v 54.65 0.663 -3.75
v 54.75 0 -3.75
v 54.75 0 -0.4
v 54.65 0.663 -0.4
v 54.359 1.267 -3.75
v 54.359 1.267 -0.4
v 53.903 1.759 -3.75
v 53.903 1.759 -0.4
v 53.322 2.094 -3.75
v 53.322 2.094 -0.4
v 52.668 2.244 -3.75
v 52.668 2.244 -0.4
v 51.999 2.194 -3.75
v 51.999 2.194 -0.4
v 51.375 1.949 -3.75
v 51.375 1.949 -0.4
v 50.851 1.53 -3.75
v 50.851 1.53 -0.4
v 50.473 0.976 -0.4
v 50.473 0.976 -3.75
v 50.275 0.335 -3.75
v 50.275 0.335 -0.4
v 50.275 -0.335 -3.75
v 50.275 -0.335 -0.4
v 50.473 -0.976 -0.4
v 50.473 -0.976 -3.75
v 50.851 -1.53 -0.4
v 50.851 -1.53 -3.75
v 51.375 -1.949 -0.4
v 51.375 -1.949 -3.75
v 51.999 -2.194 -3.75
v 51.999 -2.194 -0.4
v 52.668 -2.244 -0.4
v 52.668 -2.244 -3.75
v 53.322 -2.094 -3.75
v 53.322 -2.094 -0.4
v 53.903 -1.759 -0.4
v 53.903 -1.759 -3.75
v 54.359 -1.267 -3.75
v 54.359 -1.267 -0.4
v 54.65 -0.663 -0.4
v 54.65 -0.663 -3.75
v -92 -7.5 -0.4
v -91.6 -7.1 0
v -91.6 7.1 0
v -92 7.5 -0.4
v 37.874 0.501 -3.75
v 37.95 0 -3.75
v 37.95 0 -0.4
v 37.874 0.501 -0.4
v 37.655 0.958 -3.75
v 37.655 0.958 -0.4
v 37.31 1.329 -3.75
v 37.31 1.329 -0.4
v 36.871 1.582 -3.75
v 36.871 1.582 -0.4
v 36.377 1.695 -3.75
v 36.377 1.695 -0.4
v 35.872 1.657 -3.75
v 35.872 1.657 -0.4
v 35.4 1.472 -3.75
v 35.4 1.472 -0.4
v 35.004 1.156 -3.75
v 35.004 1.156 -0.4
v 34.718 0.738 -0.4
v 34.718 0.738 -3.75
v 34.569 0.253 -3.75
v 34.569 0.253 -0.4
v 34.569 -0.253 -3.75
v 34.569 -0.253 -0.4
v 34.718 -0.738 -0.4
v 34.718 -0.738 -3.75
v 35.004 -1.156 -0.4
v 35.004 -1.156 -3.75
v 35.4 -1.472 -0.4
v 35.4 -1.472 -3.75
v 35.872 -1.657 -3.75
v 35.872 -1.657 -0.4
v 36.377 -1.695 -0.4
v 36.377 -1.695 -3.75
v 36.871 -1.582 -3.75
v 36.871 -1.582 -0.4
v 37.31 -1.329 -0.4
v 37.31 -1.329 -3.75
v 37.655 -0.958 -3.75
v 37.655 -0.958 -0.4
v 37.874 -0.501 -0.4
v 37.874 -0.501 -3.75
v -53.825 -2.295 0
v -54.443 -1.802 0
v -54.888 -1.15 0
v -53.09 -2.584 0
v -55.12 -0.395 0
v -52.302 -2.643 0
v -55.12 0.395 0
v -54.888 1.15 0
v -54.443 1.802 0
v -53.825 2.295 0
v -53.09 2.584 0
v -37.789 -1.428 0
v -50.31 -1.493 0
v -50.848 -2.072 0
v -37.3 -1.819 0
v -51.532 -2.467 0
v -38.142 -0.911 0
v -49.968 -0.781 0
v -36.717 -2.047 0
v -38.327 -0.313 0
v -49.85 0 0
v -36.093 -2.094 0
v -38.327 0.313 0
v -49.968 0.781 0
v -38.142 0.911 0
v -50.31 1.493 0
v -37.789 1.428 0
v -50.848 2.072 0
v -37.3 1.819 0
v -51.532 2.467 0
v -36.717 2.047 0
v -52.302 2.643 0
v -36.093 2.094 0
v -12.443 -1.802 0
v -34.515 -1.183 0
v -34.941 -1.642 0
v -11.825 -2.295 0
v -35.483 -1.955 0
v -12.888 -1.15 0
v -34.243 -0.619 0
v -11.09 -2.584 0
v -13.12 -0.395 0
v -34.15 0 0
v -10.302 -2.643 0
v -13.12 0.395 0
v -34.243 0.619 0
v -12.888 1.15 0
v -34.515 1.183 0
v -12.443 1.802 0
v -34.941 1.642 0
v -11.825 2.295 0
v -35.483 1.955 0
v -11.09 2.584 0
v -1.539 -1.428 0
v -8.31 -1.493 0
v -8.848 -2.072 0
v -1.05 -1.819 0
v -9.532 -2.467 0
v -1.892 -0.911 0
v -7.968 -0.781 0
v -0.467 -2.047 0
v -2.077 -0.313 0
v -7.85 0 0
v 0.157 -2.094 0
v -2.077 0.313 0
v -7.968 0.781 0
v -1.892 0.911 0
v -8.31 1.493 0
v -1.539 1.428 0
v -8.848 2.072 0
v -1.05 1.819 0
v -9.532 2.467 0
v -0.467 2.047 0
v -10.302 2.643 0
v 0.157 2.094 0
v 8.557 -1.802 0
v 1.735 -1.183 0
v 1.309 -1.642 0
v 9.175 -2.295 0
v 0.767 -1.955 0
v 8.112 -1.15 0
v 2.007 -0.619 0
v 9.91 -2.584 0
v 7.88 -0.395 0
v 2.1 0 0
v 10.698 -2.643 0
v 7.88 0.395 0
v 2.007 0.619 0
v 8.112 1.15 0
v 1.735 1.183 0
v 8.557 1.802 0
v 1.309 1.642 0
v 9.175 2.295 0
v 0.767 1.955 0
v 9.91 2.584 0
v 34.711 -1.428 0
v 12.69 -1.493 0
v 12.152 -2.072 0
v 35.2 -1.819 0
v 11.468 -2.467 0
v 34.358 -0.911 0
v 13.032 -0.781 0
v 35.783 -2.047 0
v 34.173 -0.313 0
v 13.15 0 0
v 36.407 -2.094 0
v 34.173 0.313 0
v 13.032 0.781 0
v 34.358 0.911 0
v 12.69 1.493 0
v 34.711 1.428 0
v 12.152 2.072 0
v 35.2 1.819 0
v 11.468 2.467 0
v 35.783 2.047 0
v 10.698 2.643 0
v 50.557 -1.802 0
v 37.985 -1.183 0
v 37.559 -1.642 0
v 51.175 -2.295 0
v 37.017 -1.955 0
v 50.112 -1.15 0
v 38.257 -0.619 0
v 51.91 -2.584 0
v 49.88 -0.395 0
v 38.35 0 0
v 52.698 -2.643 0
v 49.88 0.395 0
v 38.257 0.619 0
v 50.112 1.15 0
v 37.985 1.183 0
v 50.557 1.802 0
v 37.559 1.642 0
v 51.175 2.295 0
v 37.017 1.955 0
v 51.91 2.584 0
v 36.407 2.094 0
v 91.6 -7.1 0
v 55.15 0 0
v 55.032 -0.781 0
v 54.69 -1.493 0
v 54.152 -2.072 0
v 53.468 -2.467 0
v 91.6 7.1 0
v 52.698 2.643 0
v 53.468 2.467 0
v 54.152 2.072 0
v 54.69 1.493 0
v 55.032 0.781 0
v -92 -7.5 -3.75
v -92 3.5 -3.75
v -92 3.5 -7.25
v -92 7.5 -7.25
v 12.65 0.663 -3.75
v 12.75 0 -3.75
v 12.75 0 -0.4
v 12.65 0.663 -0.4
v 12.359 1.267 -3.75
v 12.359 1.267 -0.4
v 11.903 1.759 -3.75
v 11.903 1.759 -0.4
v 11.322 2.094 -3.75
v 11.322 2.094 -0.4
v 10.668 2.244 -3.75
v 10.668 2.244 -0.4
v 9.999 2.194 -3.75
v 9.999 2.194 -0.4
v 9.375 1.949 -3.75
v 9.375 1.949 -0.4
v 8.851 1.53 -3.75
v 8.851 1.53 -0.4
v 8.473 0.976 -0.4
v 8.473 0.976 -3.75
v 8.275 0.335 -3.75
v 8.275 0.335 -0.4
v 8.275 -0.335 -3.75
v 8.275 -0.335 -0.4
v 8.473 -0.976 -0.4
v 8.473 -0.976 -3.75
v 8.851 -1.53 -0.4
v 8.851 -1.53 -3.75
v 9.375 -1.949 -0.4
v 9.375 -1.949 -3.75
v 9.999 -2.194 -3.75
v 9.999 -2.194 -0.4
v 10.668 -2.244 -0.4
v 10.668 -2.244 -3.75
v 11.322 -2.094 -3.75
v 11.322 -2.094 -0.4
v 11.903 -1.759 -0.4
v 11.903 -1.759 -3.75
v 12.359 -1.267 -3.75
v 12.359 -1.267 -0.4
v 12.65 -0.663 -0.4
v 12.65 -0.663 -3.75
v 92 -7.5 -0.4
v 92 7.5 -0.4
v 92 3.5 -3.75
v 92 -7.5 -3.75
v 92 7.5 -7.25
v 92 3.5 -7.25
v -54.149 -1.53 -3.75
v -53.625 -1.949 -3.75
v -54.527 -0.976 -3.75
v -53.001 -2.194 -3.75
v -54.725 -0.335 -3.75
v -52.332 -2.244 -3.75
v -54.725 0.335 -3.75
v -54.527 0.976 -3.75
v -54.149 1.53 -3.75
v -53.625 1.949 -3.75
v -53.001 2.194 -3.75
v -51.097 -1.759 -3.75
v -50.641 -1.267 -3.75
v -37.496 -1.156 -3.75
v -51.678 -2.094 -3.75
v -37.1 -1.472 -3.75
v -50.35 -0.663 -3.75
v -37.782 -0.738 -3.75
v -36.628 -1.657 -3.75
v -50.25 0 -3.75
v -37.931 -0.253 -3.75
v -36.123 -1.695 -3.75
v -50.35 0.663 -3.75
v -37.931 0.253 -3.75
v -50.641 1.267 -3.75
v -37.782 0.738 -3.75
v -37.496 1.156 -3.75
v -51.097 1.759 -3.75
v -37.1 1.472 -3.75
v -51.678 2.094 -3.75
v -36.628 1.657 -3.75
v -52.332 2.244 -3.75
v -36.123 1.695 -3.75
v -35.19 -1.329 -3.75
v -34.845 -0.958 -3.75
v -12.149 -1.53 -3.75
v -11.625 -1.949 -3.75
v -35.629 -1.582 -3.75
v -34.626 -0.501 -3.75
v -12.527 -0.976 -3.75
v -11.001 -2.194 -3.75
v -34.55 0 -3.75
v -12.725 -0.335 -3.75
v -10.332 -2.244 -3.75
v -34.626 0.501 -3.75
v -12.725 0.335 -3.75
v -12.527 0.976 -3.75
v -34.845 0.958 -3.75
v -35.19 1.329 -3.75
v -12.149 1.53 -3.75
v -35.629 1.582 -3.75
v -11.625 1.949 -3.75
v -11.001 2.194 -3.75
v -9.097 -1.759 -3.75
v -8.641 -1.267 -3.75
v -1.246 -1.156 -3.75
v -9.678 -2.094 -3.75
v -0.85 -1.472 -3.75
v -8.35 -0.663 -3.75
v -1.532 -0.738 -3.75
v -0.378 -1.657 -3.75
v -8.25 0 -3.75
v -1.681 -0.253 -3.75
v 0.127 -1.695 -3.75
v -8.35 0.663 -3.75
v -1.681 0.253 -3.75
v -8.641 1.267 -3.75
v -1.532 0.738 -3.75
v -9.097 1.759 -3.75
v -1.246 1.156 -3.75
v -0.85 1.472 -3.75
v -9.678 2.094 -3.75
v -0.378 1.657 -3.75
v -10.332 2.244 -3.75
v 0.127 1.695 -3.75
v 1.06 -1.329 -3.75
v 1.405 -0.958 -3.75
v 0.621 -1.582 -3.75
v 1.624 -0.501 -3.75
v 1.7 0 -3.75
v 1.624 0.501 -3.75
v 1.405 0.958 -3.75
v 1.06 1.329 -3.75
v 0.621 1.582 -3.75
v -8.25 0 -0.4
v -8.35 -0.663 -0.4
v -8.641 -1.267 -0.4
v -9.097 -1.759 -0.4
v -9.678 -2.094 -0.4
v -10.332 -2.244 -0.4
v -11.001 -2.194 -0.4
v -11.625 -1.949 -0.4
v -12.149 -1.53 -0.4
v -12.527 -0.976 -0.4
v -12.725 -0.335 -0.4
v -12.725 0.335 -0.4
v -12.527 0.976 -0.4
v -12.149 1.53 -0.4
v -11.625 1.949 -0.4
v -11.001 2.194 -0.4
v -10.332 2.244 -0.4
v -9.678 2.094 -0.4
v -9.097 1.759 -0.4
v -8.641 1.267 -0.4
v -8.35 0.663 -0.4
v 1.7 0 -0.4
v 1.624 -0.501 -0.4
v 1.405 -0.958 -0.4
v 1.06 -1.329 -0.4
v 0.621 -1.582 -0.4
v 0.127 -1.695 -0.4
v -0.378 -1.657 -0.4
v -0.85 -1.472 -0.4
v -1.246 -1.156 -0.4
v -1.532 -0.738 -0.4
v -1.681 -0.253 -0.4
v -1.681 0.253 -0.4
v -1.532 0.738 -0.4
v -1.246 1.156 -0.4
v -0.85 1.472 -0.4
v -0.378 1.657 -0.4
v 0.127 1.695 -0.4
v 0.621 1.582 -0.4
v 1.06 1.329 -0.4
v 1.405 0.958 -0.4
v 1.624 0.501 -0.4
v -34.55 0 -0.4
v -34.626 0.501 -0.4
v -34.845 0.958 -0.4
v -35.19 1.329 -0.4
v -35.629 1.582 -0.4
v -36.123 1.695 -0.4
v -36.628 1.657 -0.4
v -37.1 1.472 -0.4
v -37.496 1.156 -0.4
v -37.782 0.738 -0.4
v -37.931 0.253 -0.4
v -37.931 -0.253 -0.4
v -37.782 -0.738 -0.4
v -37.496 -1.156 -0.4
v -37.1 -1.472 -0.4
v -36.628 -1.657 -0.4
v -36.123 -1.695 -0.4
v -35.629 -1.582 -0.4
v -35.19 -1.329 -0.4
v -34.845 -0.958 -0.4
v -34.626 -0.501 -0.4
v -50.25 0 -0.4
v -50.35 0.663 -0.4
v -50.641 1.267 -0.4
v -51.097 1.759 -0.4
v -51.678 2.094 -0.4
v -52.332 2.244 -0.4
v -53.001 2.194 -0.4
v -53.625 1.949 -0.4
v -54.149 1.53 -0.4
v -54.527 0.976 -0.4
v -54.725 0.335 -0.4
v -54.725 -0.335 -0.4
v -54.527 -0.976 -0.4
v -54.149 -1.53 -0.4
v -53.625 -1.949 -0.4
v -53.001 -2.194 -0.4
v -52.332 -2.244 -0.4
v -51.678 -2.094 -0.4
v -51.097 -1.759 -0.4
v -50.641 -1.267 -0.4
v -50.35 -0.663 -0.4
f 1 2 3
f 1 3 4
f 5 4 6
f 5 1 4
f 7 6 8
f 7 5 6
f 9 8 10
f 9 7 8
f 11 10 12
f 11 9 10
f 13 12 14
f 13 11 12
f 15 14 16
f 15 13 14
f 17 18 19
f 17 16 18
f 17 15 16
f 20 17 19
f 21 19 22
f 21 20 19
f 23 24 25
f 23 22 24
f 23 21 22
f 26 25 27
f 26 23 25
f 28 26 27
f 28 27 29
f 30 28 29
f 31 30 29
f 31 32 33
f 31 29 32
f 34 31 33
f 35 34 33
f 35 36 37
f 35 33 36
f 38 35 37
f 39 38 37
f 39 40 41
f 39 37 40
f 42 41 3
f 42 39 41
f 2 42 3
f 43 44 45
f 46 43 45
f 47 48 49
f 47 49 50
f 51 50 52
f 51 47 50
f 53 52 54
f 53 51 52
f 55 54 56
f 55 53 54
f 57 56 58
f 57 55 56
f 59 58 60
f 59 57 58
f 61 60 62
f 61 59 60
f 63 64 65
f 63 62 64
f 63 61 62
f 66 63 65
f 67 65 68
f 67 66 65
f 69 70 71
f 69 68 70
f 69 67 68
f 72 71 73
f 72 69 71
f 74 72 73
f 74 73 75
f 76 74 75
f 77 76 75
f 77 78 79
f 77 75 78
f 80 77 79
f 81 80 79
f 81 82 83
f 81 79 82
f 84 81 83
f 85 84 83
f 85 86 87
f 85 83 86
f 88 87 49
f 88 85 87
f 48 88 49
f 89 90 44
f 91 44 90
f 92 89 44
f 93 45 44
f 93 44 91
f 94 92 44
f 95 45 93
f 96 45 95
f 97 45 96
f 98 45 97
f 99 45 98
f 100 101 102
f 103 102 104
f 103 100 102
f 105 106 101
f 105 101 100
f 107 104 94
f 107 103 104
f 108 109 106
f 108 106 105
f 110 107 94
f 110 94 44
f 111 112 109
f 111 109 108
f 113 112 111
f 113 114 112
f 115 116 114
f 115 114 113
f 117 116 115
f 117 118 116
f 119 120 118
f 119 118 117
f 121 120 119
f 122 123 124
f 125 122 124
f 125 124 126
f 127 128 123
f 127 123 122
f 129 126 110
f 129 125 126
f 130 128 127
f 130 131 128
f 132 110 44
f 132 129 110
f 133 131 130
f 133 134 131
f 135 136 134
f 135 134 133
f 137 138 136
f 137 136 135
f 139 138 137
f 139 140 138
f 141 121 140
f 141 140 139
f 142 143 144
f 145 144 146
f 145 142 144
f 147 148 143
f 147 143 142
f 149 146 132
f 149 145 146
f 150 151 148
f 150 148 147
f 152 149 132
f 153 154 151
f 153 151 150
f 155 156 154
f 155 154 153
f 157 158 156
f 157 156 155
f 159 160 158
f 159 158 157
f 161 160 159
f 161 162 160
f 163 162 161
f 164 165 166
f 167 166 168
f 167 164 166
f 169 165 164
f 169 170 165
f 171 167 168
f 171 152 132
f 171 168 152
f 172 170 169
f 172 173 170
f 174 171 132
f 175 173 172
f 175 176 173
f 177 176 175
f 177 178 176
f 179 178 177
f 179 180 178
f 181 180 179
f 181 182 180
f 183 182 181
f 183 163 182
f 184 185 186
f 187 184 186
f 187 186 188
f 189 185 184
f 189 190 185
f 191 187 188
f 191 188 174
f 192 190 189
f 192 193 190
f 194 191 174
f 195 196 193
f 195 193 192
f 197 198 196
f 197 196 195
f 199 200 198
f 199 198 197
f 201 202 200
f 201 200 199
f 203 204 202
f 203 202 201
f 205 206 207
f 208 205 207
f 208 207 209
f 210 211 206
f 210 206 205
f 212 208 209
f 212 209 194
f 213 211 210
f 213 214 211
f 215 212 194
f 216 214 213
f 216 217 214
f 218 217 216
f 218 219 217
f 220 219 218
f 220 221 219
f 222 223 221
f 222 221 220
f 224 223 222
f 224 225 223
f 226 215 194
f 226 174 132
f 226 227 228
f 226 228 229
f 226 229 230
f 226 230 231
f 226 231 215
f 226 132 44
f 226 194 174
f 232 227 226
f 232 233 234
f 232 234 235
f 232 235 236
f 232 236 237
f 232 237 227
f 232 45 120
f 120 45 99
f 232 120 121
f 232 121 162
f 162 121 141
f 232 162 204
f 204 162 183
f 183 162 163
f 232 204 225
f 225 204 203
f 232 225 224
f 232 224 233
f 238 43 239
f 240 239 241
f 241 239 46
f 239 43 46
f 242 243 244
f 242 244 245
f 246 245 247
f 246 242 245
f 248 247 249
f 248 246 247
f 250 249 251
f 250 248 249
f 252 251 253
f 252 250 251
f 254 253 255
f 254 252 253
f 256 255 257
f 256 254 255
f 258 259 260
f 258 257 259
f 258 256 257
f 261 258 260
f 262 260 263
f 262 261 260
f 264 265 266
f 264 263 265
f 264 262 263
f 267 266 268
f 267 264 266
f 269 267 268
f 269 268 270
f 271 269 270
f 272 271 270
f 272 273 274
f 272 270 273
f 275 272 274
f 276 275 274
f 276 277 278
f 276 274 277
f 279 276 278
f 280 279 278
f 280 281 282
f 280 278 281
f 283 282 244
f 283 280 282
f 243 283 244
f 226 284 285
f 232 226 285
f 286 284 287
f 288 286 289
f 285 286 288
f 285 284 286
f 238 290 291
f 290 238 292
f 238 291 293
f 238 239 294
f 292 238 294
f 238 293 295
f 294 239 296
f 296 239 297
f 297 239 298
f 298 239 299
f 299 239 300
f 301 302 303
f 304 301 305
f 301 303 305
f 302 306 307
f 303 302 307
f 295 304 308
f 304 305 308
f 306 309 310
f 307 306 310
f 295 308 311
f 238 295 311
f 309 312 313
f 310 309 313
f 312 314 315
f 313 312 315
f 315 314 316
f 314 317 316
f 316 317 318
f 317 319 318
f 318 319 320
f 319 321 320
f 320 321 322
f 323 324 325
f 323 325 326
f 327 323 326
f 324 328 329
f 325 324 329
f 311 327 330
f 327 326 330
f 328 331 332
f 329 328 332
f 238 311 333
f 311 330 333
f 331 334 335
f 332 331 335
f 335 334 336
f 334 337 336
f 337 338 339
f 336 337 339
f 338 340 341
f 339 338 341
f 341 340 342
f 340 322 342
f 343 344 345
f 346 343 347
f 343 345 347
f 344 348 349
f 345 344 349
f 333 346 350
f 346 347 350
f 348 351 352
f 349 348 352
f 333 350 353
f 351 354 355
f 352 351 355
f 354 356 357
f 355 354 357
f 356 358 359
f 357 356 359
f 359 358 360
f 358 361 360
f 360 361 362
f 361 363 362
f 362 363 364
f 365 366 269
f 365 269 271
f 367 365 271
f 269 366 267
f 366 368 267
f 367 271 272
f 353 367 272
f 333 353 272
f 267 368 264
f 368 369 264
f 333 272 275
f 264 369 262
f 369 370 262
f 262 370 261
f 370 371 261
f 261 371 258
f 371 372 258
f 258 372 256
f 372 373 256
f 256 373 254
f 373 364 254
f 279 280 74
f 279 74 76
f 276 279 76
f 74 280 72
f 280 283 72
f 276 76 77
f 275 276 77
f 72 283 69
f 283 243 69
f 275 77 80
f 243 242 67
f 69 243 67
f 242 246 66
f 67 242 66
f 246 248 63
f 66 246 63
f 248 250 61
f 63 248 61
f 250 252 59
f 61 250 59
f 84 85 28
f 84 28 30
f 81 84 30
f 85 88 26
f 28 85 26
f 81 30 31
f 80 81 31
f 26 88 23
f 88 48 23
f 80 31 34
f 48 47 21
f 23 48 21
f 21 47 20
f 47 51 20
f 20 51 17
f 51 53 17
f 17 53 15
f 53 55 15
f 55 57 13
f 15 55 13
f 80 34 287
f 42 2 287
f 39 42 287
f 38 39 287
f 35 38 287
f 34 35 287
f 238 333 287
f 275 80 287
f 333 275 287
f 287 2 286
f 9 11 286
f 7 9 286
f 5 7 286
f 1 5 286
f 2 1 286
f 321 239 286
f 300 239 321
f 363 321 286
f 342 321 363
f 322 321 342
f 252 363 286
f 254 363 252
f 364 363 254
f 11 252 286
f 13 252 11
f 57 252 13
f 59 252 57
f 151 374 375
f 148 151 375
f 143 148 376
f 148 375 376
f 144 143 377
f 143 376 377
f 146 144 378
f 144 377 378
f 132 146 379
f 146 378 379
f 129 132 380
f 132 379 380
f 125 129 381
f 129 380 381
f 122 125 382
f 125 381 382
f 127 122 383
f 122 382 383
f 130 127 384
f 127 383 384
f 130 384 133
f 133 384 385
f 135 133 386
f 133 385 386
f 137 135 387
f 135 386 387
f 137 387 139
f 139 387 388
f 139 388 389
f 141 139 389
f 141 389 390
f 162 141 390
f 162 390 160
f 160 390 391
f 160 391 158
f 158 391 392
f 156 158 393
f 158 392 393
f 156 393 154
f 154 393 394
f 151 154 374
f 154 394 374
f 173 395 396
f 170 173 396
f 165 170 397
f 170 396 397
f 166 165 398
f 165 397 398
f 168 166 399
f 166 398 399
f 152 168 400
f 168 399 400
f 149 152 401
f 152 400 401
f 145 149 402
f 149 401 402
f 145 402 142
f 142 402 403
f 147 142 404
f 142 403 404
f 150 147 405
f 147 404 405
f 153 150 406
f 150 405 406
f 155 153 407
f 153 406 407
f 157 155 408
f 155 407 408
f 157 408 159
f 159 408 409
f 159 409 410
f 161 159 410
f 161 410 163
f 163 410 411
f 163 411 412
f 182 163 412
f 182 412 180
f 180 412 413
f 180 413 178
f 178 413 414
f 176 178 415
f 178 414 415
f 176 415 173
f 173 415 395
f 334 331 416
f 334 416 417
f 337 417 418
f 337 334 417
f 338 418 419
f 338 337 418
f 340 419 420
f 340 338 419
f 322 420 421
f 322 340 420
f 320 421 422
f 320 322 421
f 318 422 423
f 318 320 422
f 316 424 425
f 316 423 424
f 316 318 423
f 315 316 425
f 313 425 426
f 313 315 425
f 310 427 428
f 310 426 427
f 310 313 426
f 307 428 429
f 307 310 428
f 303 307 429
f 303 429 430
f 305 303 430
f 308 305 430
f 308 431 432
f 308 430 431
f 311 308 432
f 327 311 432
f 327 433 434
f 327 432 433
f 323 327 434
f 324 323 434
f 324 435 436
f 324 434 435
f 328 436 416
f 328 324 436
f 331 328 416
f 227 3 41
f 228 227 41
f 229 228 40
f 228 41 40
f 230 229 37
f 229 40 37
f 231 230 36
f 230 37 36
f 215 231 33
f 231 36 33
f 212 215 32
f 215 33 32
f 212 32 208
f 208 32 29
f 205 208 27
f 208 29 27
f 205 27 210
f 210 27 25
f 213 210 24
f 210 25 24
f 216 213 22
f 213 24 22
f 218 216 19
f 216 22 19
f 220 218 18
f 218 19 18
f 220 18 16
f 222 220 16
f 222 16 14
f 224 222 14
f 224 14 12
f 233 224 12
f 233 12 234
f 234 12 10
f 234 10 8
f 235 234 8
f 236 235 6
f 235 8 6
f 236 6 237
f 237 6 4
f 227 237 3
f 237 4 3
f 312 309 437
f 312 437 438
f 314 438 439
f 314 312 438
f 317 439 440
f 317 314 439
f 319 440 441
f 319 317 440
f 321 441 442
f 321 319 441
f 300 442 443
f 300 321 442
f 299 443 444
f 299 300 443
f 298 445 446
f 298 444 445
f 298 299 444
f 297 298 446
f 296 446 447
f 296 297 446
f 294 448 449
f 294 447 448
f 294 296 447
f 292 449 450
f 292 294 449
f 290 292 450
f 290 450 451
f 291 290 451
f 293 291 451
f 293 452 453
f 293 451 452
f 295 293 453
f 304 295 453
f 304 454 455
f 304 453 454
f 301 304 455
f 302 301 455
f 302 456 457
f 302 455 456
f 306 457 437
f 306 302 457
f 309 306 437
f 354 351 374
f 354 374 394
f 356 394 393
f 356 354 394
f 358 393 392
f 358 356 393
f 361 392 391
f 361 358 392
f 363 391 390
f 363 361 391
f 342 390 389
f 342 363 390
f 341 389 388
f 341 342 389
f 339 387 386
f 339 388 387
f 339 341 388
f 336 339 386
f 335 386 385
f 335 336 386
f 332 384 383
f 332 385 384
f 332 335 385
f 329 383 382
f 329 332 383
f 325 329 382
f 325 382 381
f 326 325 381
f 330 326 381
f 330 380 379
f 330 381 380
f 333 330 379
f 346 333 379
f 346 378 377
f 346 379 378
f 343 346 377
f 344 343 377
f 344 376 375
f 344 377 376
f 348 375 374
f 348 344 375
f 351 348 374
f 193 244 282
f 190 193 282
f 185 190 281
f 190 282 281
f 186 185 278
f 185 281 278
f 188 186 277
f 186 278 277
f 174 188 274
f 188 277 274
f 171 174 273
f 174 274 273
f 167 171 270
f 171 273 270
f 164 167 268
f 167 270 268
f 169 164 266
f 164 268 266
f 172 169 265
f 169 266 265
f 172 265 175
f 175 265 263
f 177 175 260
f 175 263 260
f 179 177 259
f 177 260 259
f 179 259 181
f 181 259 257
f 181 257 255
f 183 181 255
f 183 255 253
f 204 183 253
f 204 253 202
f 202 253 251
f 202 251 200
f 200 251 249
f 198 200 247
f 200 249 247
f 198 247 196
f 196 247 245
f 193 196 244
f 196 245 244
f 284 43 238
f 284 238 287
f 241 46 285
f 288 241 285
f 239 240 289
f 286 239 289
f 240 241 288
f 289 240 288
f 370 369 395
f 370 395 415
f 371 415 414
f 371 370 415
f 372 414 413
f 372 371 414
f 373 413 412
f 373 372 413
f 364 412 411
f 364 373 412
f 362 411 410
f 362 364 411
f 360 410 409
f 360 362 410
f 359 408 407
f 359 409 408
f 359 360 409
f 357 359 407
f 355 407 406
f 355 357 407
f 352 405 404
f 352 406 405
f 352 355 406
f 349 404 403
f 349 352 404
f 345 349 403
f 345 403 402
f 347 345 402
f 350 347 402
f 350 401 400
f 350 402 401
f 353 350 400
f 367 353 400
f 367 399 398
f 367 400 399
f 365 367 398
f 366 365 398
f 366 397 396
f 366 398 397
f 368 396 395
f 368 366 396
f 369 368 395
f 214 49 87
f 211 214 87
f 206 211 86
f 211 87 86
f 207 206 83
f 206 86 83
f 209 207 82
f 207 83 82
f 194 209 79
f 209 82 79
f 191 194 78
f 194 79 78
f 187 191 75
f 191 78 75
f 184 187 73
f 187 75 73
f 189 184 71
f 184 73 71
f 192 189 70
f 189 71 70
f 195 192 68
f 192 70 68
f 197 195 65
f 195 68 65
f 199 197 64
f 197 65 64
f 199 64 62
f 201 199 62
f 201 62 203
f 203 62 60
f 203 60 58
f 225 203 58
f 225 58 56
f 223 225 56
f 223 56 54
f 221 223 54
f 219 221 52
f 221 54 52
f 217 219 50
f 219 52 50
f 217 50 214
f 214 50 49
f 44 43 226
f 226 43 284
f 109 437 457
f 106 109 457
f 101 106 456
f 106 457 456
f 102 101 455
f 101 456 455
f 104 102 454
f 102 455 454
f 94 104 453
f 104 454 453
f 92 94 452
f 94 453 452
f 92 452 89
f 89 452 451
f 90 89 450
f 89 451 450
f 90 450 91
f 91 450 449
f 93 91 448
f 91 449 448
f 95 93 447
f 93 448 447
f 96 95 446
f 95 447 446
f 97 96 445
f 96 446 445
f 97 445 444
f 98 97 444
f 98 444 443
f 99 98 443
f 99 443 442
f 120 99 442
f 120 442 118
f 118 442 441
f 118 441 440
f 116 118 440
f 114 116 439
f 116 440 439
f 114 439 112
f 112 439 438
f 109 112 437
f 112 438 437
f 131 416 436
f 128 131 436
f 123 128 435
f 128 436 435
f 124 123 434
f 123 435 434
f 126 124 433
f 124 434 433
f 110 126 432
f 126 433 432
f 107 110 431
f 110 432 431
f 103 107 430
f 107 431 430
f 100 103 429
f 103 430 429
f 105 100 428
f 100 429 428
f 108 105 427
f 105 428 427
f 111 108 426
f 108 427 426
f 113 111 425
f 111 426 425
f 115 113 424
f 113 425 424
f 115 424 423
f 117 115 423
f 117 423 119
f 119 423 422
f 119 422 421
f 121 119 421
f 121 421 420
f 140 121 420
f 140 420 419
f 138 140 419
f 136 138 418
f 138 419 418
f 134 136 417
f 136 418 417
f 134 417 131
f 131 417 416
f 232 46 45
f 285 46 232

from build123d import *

# Parameters (mm, degrees)
SKETCH1_W               = 184
SKETCH1_H               = 15
BOSS_EXTRUDE1_DEPTH     = 7.25
CUT_EXTRUDE1_START      = -7.25
SKETCH1_6_W             = 184
SKETCH1_6_H             = 11
CUT_EXTRUDE1_DEPTH      = 3.5
CUT_EXTRUDE2_DEPTH      = 93.589483744
CUT_EXTRUDE2_DEPTH_BACK = 93.589483744
SKETCH2_R               = 2.25
SKETCH2_R_2             = 1.7
CHAMFER1_SIZE           = 0.4


with BuildPart() as part:
    # Sketch1 → Boss-Extrude1 (new body)
    with BuildSketch(Plane.XY):
        Rectangle(SKETCH1_W, SKETCH1_H)
    extrude(amount=-BOSS_EXTRUDE1_DEPTH)

    # Sketch1<6> → Cut-Extrude1 (cut)
    with BuildSketch(Plane.XY.offset(CUT_EXTRUDE1_START)):
        with Locations((0, -2)):
            Rectangle(SKETCH1_6_W, SKETCH1_6_H)
    extrude(amount=CUT_EXTRUDE1_DEPTH, mode=Mode.SUBTRACT)

    # Sketch2 → Cut-Extrude2 (cut, two sides: drawn at the far end of the back side and taken through both)
    with BuildSketch(Plane.XY.offset(-CUT_EXTRUDE2_DEPTH_BACK)):
        with Locations((-52.5, 0)):
            Circle(SKETCH2_R)
        with Locations((-36.25, 0)):
            Circle(SKETCH2_R_2)
        with Locations((-10.5, 0)):
            Circle(SKETCH2_R)
        Circle(SKETCH2_R_2)
        with Locations((10.5, 0)):
            Circle(SKETCH2_R)
        with Locations((36.25, 0)):
            Circle(SKETCH2_R_2)
        with Locations((52.5, 0)):
            Circle(SKETCH2_R)
    extrude(amount=CUT_EXTRUDE2_DEPTH + CUT_EXTRUDE2_DEPTH_BACK, mode=Mode.SUBTRACT)

    # Chamfer1
    chamfer1_edges = [part.edges().sort_by_distance(p)[0] for p in [
        (-54.75, 0, 0),
        (-37.95, 0, 0),
        (-12.75, 0, 0),
        (-1.7, 0, 0),
        (8.25, 0, 0),
        (34.55, 0, 0),
        (50.25, 0, 0),
        (0, -7.5, 0),
        (-92, 0, 0),
        (0, 7.5, 0),
        (92, 0, 0),
    ]]
    chamfer(chamfer1_edges, length=CHAMFER1_SIZE)


solid = part.part
